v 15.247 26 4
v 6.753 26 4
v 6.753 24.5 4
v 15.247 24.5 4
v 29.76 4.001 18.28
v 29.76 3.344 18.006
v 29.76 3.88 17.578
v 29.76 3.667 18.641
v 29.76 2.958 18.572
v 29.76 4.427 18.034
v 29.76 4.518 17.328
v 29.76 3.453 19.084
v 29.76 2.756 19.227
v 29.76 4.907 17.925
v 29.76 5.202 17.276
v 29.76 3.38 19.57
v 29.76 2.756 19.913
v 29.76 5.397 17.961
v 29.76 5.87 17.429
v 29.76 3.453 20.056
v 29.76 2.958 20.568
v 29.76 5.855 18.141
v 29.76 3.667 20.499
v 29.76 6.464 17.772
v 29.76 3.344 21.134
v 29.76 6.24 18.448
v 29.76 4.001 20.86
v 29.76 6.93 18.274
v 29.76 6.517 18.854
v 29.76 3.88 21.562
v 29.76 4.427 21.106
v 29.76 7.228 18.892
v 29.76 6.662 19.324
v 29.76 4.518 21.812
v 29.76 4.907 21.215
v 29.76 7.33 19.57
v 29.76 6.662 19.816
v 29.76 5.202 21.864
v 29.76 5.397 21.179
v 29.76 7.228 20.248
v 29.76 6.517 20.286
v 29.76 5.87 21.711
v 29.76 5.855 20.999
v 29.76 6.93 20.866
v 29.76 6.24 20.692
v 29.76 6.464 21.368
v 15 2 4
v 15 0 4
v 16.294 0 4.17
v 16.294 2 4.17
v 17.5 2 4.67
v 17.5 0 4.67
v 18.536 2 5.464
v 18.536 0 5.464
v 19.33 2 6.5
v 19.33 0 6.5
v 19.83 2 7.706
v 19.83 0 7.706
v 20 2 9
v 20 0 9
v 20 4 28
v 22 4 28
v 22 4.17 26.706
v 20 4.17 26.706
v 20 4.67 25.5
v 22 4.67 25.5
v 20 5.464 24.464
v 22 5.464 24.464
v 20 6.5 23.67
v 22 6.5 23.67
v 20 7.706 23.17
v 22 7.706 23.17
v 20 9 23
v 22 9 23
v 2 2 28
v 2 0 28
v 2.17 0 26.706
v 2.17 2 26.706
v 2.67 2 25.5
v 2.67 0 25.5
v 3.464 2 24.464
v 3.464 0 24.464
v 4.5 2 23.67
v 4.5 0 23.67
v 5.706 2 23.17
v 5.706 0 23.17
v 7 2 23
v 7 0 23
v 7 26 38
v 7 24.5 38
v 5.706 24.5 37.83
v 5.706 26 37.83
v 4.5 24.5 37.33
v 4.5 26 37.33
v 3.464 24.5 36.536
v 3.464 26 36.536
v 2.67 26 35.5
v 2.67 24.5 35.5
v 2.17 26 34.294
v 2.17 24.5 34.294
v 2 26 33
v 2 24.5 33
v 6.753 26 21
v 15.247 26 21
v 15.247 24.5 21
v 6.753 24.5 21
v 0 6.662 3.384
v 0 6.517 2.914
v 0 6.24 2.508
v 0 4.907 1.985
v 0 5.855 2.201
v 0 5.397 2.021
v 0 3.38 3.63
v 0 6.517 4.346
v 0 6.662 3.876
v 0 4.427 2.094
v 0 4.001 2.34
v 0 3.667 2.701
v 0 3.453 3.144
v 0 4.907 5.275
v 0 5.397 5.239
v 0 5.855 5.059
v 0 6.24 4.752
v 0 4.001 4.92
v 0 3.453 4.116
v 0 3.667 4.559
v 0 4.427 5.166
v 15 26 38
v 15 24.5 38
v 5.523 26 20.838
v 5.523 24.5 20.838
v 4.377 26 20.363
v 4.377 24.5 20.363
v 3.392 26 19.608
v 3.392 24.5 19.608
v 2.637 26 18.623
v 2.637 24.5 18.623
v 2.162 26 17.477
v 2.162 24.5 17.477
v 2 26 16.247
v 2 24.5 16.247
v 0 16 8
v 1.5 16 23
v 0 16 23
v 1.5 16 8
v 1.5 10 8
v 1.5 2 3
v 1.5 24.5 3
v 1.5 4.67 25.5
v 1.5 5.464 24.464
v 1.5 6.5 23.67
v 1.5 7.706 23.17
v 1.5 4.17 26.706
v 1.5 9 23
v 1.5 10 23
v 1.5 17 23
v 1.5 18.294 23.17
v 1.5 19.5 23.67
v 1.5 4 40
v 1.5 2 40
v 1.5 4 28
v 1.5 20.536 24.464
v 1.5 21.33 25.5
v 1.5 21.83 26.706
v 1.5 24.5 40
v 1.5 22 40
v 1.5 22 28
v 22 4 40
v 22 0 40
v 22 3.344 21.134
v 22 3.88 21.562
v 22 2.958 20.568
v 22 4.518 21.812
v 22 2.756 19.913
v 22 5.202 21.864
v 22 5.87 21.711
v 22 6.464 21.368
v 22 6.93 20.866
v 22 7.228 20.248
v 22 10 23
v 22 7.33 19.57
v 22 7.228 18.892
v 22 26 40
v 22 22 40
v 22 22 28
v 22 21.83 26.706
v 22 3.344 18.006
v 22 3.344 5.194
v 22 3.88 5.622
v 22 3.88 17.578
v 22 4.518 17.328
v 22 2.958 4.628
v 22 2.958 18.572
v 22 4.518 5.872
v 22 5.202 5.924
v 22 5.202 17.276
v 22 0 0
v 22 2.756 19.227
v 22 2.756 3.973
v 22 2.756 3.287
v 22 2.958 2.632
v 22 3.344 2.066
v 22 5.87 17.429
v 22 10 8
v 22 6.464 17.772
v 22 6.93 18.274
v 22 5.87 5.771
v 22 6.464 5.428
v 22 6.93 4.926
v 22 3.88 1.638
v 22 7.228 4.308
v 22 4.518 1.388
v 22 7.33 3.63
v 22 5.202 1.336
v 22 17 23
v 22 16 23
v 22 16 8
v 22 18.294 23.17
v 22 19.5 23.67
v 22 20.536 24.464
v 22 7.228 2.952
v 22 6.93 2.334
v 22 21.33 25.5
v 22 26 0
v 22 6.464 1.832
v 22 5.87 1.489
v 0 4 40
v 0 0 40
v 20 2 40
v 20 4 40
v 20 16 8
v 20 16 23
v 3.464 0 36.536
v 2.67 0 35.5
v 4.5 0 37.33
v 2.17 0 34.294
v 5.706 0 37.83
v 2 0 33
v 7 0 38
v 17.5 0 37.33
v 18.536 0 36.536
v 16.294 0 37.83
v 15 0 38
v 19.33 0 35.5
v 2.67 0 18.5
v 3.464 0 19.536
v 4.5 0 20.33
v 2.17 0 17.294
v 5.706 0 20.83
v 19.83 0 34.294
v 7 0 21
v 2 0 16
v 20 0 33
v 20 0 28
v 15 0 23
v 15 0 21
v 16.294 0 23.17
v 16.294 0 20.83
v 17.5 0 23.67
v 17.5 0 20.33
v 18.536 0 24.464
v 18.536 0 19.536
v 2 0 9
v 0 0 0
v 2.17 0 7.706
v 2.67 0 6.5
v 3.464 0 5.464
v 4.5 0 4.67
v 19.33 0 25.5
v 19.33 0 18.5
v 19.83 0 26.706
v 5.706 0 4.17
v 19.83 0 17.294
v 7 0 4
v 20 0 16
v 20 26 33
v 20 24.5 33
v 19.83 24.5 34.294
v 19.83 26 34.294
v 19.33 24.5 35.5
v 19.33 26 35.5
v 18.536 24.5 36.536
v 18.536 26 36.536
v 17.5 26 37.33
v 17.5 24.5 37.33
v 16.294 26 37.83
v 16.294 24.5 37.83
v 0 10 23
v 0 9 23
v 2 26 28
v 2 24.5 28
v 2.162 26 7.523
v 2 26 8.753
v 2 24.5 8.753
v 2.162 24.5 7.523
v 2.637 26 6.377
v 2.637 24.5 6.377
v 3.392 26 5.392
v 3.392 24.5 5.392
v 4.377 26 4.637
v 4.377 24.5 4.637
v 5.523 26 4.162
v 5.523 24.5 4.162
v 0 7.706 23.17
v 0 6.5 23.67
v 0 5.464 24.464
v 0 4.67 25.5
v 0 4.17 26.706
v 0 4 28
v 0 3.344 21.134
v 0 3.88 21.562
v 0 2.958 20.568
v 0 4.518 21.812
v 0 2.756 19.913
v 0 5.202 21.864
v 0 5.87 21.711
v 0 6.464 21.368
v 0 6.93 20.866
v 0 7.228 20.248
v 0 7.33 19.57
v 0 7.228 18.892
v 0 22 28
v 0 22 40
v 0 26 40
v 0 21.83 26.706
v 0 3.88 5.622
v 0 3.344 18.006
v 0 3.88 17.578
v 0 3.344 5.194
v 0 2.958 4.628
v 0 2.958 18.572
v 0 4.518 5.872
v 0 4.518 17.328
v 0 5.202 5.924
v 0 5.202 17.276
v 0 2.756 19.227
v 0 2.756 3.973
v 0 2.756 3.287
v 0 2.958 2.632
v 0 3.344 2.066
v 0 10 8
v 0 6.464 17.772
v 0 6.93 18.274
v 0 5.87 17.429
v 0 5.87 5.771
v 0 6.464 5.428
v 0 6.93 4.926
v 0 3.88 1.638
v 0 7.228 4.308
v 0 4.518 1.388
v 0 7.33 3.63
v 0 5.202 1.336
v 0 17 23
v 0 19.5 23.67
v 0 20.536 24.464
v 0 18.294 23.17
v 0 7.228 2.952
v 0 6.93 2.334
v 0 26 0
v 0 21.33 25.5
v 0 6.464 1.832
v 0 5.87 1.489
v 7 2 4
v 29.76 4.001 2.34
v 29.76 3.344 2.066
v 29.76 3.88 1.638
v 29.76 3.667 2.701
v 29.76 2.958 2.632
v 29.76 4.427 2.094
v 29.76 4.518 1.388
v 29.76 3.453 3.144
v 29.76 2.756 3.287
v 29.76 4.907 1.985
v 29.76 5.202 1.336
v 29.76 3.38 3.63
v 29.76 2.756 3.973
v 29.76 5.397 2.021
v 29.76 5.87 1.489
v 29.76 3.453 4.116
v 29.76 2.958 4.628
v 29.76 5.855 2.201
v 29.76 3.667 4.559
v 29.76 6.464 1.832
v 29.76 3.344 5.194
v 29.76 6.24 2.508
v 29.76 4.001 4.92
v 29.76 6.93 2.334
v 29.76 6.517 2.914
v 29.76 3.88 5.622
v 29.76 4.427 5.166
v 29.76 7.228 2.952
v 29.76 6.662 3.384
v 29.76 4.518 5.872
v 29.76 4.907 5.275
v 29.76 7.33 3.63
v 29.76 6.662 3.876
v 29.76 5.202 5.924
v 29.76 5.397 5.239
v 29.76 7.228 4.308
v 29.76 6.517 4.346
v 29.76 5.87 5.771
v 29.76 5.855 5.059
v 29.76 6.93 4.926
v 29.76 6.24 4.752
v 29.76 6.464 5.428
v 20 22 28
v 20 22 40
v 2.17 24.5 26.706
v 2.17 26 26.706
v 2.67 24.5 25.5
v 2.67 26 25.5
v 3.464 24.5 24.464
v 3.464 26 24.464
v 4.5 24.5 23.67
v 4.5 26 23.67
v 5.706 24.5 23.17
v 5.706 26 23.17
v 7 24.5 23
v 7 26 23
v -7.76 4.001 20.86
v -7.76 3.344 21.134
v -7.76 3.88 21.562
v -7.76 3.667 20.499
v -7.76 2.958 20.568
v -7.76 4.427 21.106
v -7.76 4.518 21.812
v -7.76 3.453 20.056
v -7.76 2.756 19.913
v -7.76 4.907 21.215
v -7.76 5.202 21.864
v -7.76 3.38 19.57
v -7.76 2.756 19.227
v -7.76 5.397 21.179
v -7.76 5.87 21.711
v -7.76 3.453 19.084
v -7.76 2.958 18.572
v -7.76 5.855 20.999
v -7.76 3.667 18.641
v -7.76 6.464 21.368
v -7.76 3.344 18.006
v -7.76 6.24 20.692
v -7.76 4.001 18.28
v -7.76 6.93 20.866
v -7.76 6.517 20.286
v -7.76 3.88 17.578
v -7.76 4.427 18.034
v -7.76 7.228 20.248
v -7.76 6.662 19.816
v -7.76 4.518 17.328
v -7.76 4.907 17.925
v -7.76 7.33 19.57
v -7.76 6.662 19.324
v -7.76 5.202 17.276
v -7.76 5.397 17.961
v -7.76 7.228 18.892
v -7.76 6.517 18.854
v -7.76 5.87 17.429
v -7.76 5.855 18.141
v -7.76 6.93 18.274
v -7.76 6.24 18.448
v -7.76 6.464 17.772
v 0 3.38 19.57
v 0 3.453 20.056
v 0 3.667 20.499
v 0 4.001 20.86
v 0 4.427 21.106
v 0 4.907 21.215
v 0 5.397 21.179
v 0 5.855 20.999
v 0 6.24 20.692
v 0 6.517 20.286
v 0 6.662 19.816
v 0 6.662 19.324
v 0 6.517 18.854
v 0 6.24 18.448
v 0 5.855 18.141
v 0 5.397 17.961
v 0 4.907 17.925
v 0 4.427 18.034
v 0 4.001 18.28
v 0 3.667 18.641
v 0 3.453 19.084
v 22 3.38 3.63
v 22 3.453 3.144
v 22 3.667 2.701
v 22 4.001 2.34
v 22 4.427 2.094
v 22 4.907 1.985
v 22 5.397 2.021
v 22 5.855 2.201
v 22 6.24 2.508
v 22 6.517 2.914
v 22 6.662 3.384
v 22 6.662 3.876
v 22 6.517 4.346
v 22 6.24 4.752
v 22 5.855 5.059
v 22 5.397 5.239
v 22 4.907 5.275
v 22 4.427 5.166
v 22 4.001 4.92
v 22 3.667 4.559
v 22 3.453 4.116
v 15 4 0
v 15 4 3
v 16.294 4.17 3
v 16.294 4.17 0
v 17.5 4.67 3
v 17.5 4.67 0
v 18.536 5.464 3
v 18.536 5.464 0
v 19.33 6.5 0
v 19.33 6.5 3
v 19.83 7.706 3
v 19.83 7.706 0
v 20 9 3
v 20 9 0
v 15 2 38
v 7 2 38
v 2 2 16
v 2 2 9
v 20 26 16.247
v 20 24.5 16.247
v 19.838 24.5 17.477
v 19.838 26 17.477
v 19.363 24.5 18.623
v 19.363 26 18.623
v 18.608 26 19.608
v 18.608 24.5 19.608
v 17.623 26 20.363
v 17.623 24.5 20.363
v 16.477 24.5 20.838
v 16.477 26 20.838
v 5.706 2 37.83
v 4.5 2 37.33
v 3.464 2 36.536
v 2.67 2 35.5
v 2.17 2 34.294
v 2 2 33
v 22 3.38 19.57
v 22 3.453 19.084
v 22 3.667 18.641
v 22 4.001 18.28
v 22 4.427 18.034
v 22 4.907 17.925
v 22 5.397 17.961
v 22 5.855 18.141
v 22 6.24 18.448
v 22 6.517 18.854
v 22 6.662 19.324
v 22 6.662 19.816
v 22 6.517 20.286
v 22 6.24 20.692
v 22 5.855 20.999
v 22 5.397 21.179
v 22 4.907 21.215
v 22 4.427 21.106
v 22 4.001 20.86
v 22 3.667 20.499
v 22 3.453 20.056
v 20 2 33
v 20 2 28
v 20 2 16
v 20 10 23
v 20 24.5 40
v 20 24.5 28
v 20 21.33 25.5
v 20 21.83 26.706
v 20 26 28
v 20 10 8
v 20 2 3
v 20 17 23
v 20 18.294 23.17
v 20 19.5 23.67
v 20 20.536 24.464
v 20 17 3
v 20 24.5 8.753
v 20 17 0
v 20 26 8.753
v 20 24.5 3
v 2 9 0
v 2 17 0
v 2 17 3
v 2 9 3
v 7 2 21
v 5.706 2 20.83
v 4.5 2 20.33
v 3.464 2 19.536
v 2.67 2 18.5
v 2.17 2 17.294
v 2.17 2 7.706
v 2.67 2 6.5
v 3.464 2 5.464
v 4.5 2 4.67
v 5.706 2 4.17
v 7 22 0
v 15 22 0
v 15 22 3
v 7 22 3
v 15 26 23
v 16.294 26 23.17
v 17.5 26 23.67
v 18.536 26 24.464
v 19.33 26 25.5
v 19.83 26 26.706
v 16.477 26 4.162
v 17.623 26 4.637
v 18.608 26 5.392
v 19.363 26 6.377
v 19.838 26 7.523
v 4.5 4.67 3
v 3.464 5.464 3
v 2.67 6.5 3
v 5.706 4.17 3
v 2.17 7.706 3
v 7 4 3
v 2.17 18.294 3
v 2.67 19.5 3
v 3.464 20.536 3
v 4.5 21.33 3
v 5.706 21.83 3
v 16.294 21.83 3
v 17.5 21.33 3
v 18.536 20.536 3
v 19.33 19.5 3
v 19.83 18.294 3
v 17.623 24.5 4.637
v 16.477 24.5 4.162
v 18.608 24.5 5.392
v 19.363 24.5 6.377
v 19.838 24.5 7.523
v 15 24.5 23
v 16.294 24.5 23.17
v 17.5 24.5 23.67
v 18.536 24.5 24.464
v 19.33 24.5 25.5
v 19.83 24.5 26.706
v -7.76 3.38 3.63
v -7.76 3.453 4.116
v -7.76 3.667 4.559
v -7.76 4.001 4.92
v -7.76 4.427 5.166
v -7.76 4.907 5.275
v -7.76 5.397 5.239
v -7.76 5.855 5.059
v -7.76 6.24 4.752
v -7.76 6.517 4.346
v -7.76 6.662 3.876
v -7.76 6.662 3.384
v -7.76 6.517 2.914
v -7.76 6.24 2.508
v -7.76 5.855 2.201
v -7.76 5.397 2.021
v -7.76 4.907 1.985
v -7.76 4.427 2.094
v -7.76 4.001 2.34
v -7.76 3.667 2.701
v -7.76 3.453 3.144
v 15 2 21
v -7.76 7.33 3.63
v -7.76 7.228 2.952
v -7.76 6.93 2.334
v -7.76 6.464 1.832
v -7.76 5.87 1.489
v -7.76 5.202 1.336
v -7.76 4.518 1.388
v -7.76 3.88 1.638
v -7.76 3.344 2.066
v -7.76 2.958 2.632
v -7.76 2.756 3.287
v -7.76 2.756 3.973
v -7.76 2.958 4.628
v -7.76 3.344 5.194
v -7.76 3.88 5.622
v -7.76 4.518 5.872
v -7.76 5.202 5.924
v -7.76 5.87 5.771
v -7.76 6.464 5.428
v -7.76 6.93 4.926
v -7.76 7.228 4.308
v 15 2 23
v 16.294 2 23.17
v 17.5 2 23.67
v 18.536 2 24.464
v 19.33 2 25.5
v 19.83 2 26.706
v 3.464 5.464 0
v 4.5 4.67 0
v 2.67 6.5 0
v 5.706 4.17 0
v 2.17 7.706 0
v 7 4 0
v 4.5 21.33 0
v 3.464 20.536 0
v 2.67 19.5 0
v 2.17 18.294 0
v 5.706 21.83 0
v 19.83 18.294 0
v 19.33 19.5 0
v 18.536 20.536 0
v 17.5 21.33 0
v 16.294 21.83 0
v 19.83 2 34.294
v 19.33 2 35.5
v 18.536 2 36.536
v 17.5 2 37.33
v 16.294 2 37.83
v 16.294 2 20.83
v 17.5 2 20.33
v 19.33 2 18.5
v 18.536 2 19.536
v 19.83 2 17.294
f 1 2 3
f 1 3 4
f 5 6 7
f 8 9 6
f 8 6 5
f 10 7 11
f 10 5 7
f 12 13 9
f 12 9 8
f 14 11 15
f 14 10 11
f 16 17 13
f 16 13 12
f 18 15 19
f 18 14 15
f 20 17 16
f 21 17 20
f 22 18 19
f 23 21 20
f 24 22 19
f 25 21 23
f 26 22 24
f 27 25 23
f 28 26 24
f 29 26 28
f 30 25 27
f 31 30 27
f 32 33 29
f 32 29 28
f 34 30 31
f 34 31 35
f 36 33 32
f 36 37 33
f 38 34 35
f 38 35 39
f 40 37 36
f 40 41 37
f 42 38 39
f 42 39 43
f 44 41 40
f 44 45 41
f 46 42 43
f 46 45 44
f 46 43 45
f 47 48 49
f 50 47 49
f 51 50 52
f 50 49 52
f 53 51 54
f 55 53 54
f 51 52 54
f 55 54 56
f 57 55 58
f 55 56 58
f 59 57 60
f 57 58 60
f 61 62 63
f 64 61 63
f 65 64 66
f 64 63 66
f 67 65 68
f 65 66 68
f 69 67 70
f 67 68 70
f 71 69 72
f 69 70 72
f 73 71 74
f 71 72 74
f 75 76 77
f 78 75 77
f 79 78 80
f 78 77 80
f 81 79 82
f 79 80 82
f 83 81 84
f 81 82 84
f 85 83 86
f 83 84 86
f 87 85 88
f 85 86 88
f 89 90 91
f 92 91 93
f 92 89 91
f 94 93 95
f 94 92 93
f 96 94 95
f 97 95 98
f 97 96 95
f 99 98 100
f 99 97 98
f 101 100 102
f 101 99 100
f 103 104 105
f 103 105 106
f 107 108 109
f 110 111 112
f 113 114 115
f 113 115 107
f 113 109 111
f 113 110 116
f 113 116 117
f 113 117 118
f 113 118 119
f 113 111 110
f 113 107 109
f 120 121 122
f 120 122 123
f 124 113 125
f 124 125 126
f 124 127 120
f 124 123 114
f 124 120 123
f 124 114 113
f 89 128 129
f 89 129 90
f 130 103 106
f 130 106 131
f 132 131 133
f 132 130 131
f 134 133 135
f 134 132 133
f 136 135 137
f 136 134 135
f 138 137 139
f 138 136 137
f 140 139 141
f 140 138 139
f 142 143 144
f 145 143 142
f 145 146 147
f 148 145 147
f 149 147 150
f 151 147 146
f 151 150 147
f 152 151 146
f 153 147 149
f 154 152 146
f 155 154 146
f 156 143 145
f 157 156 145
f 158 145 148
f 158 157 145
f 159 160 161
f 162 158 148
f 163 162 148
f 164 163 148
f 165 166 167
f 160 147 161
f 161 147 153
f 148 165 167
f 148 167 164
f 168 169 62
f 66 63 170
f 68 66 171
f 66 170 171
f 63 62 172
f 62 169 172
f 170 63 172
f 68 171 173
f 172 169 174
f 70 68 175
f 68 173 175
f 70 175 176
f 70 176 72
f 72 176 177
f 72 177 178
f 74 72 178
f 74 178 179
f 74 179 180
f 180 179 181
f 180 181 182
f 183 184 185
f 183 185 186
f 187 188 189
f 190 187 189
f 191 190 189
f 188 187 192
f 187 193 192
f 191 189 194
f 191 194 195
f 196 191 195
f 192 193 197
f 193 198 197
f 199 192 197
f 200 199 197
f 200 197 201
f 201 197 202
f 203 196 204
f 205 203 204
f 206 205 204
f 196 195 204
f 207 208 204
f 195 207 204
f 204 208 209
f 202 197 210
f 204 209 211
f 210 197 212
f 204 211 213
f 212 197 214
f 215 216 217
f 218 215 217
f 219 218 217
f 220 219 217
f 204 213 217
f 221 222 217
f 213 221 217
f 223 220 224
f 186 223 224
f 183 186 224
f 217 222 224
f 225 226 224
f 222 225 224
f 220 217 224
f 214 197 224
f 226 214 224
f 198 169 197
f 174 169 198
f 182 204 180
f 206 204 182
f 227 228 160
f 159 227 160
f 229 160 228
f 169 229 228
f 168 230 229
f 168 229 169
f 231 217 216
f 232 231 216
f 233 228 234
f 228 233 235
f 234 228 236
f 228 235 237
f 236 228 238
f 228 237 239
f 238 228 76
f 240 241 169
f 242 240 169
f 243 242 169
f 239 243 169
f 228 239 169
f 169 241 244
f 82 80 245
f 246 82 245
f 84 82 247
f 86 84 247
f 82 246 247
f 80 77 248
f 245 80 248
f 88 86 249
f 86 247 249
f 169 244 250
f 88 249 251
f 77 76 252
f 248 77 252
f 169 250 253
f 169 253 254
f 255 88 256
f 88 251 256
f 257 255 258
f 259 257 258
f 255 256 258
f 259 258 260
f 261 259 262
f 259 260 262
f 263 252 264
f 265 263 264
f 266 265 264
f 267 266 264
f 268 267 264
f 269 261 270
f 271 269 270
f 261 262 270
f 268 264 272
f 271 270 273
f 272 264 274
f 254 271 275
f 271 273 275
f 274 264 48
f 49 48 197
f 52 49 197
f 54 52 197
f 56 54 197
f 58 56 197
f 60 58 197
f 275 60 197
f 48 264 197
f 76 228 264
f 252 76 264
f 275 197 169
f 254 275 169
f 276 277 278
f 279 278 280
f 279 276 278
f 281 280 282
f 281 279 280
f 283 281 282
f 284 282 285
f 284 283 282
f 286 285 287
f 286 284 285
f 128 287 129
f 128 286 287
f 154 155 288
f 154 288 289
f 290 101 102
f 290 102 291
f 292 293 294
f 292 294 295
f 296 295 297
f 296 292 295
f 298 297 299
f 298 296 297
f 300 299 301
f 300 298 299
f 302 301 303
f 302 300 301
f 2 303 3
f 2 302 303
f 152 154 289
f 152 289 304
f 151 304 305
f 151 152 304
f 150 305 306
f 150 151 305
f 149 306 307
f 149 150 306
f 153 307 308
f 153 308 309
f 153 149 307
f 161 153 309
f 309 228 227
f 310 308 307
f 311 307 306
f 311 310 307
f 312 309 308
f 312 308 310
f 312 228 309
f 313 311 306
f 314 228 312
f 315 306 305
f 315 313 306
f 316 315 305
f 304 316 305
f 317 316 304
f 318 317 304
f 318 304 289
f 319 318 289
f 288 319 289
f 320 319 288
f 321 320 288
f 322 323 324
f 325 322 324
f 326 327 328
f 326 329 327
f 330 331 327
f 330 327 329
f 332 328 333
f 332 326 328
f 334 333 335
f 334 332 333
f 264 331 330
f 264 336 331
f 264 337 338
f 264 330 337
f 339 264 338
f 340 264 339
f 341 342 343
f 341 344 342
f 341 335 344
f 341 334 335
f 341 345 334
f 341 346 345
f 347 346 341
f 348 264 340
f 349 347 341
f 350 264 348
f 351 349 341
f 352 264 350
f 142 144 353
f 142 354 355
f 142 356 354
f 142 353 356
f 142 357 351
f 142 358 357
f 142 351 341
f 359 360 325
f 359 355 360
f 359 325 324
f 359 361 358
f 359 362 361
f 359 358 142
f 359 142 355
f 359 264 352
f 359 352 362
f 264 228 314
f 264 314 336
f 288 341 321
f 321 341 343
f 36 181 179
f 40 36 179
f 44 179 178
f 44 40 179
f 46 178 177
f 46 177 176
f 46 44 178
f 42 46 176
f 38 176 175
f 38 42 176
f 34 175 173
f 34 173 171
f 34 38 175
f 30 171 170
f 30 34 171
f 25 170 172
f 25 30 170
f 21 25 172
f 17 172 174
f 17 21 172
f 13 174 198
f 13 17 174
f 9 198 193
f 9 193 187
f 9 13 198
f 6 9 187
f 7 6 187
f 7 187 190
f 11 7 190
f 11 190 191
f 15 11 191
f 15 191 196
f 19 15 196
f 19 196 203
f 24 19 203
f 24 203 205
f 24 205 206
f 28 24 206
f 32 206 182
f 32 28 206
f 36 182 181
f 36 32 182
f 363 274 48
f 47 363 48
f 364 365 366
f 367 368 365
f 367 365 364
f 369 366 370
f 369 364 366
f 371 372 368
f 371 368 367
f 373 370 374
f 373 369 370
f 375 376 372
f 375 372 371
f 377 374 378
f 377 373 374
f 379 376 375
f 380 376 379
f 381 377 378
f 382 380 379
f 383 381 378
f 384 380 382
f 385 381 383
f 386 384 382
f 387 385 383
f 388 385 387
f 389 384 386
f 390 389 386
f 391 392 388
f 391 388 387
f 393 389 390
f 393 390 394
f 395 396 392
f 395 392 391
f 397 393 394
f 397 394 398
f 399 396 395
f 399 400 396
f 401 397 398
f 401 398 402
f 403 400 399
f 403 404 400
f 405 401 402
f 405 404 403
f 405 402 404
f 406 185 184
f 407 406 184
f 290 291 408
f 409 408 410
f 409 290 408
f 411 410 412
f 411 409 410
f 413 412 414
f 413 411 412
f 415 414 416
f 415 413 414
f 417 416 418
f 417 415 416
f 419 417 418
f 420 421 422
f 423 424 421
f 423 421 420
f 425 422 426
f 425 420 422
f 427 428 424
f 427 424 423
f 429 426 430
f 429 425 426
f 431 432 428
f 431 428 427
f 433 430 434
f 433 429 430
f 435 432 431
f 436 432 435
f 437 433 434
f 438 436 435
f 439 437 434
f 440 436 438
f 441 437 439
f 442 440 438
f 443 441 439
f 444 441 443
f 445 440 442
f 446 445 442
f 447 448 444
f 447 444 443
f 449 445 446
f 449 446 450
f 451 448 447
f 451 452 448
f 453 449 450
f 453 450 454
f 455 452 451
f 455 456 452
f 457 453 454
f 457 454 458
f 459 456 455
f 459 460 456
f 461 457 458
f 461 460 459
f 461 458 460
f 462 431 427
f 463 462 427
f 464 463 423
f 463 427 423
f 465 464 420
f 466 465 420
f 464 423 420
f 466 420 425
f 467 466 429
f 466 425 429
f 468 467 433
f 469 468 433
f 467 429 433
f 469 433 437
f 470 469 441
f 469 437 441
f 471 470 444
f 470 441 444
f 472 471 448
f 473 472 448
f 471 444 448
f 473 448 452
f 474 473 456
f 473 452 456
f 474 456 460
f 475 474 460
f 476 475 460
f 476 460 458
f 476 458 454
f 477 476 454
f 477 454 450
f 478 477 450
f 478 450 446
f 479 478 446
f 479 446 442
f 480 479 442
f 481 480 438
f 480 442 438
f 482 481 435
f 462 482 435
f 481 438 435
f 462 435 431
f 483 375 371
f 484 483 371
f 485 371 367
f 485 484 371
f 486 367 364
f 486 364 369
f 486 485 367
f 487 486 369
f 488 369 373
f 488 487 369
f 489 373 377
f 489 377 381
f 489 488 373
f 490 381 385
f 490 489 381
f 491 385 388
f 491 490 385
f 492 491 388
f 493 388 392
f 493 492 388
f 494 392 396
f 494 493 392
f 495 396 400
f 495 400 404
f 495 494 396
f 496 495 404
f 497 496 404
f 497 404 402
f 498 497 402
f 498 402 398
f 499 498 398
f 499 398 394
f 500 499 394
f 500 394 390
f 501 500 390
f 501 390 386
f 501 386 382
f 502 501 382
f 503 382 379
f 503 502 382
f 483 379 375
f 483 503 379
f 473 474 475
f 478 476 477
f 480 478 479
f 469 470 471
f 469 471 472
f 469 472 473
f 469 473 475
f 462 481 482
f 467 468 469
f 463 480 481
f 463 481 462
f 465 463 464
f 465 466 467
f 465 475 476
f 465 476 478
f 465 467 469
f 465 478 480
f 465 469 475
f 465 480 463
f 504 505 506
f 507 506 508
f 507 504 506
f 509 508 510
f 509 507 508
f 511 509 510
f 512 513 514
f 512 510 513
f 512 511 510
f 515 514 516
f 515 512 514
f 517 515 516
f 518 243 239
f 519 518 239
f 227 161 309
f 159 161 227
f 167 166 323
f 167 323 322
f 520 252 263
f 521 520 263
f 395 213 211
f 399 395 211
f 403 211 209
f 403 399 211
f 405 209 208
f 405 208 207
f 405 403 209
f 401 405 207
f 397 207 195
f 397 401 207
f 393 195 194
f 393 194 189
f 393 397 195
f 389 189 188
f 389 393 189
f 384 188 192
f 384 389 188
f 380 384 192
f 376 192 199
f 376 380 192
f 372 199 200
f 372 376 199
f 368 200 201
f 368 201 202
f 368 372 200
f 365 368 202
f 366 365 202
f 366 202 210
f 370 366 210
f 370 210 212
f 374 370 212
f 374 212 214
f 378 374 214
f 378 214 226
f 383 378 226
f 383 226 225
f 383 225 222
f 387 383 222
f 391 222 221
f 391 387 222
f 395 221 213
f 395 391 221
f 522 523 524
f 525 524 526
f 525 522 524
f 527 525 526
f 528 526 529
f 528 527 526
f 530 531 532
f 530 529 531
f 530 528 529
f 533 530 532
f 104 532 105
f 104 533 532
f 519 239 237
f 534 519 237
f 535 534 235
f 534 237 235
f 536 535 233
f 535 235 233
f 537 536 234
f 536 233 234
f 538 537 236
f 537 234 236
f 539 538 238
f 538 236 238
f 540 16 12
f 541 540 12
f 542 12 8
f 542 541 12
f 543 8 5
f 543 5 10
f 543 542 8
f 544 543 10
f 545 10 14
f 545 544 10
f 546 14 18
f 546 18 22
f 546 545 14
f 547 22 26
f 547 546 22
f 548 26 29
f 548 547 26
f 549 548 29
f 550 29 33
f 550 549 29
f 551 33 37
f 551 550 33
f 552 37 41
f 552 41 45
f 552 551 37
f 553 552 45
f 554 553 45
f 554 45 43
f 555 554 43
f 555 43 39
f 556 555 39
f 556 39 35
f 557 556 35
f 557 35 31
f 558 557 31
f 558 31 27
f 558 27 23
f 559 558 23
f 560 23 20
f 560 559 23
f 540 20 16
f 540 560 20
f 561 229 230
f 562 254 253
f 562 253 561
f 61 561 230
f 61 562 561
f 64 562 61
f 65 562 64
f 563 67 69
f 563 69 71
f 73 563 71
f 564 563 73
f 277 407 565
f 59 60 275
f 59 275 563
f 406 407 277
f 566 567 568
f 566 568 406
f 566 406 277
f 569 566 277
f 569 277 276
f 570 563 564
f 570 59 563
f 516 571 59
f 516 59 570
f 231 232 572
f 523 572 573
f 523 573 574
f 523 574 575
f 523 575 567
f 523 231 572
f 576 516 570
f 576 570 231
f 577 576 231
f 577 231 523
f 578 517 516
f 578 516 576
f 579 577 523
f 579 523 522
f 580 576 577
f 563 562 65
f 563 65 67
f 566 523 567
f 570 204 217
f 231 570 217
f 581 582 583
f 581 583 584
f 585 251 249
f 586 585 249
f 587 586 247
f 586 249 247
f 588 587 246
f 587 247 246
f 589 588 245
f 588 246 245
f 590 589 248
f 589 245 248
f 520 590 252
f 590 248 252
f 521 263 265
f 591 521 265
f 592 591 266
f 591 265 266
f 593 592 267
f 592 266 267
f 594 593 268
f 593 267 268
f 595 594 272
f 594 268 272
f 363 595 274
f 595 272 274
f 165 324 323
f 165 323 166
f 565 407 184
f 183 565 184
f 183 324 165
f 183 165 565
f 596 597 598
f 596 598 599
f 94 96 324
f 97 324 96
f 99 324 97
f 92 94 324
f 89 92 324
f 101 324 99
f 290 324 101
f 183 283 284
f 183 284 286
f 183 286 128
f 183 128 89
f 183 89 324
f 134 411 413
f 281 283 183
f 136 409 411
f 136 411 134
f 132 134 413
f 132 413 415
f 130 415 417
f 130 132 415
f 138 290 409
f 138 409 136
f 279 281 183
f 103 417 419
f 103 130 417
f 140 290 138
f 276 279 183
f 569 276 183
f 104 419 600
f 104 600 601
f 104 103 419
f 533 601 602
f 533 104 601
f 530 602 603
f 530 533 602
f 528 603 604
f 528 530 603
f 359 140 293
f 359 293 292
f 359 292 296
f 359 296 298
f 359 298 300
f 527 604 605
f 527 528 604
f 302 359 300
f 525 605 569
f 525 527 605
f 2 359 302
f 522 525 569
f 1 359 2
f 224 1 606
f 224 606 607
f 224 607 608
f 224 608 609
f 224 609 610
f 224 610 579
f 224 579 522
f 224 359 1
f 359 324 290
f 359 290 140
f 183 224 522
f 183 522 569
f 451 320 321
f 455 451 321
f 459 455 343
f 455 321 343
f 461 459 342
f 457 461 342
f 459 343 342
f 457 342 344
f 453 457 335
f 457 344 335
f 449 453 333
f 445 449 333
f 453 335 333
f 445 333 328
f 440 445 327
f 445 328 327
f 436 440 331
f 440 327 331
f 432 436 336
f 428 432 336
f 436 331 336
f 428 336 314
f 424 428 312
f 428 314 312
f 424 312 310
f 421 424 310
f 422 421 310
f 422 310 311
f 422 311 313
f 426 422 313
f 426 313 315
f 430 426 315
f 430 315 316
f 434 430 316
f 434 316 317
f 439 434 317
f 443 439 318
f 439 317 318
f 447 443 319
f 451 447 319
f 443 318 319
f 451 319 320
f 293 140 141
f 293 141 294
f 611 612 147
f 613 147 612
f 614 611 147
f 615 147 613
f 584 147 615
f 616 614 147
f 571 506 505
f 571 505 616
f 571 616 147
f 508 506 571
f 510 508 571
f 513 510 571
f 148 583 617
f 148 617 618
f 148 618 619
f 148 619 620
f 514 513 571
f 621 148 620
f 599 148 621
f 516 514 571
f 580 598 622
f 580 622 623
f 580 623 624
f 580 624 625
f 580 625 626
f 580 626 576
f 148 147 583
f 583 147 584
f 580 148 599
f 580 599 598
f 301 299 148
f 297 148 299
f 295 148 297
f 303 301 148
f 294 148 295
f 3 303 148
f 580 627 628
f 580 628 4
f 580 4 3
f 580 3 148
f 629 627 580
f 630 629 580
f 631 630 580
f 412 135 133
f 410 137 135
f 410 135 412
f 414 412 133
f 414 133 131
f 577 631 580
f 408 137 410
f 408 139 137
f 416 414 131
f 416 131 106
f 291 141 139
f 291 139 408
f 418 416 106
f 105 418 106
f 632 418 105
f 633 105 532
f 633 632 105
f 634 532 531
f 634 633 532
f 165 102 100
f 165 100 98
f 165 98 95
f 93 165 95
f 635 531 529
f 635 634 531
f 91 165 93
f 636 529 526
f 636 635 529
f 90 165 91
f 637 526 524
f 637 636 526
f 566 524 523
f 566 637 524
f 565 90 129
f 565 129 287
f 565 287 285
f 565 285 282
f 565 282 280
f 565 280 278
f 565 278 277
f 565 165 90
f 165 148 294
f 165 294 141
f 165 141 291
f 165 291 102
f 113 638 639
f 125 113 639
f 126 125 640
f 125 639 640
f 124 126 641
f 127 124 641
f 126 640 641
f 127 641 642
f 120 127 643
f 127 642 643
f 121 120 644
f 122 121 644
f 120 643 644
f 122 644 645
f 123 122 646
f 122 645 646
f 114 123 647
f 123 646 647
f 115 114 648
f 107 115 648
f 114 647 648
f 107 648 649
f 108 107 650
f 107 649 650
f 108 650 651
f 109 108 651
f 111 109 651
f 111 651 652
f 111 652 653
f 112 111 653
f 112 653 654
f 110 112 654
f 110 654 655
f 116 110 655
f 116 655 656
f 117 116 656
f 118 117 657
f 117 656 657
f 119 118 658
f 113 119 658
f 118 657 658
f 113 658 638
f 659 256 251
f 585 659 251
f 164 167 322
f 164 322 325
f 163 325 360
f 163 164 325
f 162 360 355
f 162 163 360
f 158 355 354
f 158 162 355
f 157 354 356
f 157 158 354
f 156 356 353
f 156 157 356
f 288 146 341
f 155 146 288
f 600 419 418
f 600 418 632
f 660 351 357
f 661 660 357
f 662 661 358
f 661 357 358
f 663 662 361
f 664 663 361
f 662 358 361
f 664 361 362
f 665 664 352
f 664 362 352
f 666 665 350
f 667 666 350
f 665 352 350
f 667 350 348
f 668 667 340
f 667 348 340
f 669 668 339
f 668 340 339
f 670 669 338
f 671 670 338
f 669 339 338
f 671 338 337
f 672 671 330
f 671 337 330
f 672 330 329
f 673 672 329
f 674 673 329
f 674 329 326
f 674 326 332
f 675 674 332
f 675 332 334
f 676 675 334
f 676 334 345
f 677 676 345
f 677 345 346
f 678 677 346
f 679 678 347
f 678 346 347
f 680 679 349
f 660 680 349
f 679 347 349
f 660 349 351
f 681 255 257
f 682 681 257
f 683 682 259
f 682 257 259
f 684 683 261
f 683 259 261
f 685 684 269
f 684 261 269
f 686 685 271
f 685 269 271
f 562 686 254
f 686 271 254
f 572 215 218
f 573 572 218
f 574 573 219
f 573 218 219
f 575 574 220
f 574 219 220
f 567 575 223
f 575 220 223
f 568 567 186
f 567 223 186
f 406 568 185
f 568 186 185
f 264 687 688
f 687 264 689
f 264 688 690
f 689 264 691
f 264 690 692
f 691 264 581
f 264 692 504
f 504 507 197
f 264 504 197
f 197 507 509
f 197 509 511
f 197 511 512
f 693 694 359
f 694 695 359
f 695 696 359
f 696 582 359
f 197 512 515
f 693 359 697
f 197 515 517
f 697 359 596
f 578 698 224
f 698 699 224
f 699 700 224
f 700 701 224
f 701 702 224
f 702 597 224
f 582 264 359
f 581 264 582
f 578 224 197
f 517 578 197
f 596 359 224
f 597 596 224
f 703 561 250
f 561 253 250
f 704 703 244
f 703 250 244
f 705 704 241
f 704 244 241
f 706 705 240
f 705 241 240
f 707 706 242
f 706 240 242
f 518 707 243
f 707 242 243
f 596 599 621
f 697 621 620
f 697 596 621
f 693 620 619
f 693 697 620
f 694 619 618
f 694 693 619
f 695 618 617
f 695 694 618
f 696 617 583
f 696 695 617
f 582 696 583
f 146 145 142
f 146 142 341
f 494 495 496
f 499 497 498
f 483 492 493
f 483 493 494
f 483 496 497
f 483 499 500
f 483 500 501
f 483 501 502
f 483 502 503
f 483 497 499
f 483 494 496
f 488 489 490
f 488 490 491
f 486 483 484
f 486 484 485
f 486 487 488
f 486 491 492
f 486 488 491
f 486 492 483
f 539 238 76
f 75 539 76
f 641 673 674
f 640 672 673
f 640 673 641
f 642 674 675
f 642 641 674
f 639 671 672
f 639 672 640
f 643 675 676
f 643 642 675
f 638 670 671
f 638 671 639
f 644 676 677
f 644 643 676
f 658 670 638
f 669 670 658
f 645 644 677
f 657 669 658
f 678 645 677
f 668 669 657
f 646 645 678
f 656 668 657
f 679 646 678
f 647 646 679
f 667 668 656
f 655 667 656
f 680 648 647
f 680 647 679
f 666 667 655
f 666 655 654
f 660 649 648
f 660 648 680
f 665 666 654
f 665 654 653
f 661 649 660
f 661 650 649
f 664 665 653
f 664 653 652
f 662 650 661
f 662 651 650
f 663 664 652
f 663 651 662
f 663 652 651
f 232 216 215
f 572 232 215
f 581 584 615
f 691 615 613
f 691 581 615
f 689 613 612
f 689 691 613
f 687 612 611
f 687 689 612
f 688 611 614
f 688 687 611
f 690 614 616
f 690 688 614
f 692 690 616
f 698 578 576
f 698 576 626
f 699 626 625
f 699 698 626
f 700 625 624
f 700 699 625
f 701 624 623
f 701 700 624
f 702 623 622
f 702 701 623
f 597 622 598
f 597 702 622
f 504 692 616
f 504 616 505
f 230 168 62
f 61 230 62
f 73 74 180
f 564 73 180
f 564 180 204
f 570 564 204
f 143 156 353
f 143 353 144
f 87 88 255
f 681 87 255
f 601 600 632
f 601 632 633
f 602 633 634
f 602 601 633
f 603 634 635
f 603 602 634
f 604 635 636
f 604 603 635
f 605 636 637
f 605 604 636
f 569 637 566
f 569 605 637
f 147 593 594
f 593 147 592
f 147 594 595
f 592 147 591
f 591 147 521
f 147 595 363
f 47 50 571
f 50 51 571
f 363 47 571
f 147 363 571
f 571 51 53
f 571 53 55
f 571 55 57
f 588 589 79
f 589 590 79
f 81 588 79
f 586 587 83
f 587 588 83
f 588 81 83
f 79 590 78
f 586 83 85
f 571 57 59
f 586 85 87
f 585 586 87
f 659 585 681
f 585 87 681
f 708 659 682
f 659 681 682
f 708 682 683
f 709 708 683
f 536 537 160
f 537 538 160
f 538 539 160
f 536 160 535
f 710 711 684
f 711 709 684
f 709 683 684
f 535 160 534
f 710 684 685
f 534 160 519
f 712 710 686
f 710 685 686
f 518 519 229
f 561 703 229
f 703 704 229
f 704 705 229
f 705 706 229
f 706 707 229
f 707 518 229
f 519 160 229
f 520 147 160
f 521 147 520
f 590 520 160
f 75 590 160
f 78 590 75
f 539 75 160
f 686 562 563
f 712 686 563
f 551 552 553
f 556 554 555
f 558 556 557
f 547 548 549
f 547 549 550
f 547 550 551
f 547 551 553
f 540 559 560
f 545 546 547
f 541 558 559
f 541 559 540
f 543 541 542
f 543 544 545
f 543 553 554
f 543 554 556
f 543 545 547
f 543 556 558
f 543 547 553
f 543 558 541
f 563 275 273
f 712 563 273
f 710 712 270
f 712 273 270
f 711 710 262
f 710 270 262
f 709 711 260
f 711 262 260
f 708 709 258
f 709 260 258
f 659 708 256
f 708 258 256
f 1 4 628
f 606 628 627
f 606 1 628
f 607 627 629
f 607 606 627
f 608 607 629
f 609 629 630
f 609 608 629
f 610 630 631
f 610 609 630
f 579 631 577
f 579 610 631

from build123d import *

# Parameters (mm, degrees)
SKETCH1_W           = 22
SKETCH1_H           = 26
BOSS_EXTRUDE1_DEPTH = 40
SKETCH2_W           = 18.5
SKETCH2_H           = 22.5
CUT_EXTRUDE1_DEPTH  = 37
CUT_EXTRUDE2_REACH  = 54.536
CUT_EXTRUDE3_DEPTH  = 2
CUT_EXTRUDE4_START  = -1.5
CUT_EXTRUDE4_DEPTH  = 1.5
CUT_EXTRUDE5_REACH  = 54.536
CUT_EXTRUDE6_REACH  = 54.536
SKETCH12_R          = 2.3
BOSS_EXTRUDE2_DEPTH = 7.76
SKETCH14_R          = 1.65
CUT_EXTRUDE9_DEPTH  = 7.76
SKETCH16_R          = 1.65
CUT_EXTRUDE11_DEPTH = 7.76
BOSS_EXTRUDE3_START = 7.76
SKETCH17_R          = 2.3
BOSS_EXTRUDE3_DEPTH = 7.76
CUT_EXTRUDE12_START = -7.76
SKETCH20_R          = 1.65
CUT_EXTRUDE12_DEPTH = 7.76


with BuildPart() as part:
    # Sketch1 → Boss-Extrude1 (new body)
    with BuildSketch(Plane.XY):
        with Locations((11, 13)):
            Rectangle(SKETCH1_W, SKETCH1_H)
    extrude(amount=BOSS_EXTRUDE1_DEPTH)

    # Sketch2 → Cut-Extrude1 (cut)
    with BuildSketch(Plane.XY.offset(40)):
        with Locations((10.75, 13.25)):
            Rectangle(SKETCH2_W, SKETCH2_H)
    extrude(amount=-CUT_EXTRUDE1_DEPTH, mode=Mode.SUBTRACT)

    # Sketch6 → Cut-Extrude2 (cut, up to next)
    with BuildSketch(Plane(origin=(0, 0, 0), x_dir=(-1, 0, 0), z_dir=(0, 0, -1)), mode=Mode.PRIVATE) as cut_extrude2_sk1:
        with BuildLine():
            Line((-15, 22), (-7, 22))
            ThreePointArc((-7, 22), (-3.464466094, 20.535533906), (-2, 17))
            Line((-2, 17), (-2, 9))
            ThreePointArc((-2, 9), (-3.464466094, 5.464466094), (-7, 4))
            Line((-7, 4), (-15, 4))
            ThreePointArc((-15, 4), (-18.535533906, 5.464466094), (-20, 9))
            Line((-20, 9), (-20, 17))
            ThreePointArc((-20, 17), (-18.535533906, 20.535533906), (-15, 22))
        make_face()
    cut_extrude2_tool1 = extrude(cut_extrude2_sk1.sketch, amount=-CUT_EXTRUDE2_REACH, mode=Mode.PRIVATE) & part.part
    add(cut_extrude2_tool1.solids().sort_by_distance((11, 13, 0))[0], mode=Mode.SUBTRACT)

    # Sketch7 → Cut-Extrude3 (cut)
    with BuildSketch(Plane(origin=(22, 0, 0), x_dir=(0, 0, -1), z_dir=(1, 0, 0))):
        with BuildLine():
            Line((-8, 16), (-23, 16))
            Line((-23, 16), (-23, 17))
            ThreePointArc((-23, 17), (-24.464466094, 20.535533906), (-28, 22))
            Line((-28, 22), (-40, 22))
            Line((-40, 22), (-40, 16))
            Line((-40, 16), (-40, 10))
            Line((-40, 10), (-40, 4))
            Line((-40, 4), (-28, 4))
            ThreePointArc((-28, 4), (-24.464466094, 5.464466094), (-23, 9))
            Line((-23, 9), (-23, 10))
            Line((-23, 10), (-8, 10))
            Line((-8, 10), (-8, 16))
        make_face()
    extrude(amount=-CUT_EXTRUDE3_DEPTH, mode=Mode.SUBTRACT)

    # Sketch8 → Cut-Extrude4 (cut)
    with BuildSketch(Plane.ZY.offset(CUT_EXTRUDE4_START)):
        with BuildLine():
            Line((23, 17), (23, 16))
            Line((23, 16), (8, 16))
            Line((8, 16), (8, 10))
            Line((8, 10), (23, 10))
            Line((23, 10), (23, 9))
            ThreePointArc((23, 9), (24.464466094, 5.464466094), (28, 4))
            Line((28, 4), (40, 4))
            Line((40, 4), (40, 22))
            Line((40, 22), (28, 22))
            ThreePointArc((28, 22), (24.464466094, 20.535533906), (23, 17))
        make_face()
    extrude(amount=CUT_EXTRUDE4_DEPTH, mode=Mode.SUBTRACT)

    # Sketch9 → Cut-Extrude5 (cut, up to next)
    with BuildSketch(Plane(origin=(0, 26, 0), x_dir=(1, 0, 0), z_dir=(0, 1, 0)), mode=Mode.PRIVATE) as cut_extrude5_sk1:
        with BuildLine():
            Line((7, -23), (15, -23))
            ThreePointArc((15, -23), (18.535533906, -24.464466094), (20, -28))
            Line((20, -28), (20, -33))
            ThreePointArc((20, -33), (18.535533906, -36.535533906), (15, -38))
            Line((15, -38), (7, -38))
            ThreePointArc((7, -38), (3.464466094, -36.535533906), (2, -33))
            Line((2, -33), (2, -28))
            ThreePointArc((2, -28), (3.464466094, -24.464466094), (7, -23))
        make_face()
    cut_extrude5_tool1 = extrude(cut_extrude5_sk1.sketch, amount=-CUT_EXTRUDE5_REACH, mode=Mode.PRIVATE) & part.part
    # Sketch9 → Cut-Extrude5 (cut, up to next)
    with BuildSketch(Plane(origin=(0, 26, 0), x_dir=(1, 0, 0), z_dir=(0, 1, 0)), mode=Mode.PRIVATE) as cut_extrude5_sk2:
        with BuildLine():
            Line((2, -16.246572976), (2, -8.753427024))
            ThreePointArc((2, -8.753427024), (3.392246541, -5.392246541), (6.753427024, -4))
            Line((6.753427024, -4), (15.246572976, -4))
            ThreePointArc((15.246572976, -4), (18.607753459, -5.392246541), (20, -8.753427024))
            Line((20, -8.753427024), (20, -16.246572976))
            ThreePointArc((20, -16.246572976), (18.607753459, -19.607753459), (15.246572976, -21))
            Line((15.246572976, -21), (6.753427024, -21))
            ThreePointArc((6.753427024, -21), (3.392246541, -19.607753459), (2, -16.246572976))
        make_face()
    cut_extrude5_tool2 = extrude(cut_extrude5_sk2.sketch, amount=-CUT_EXTRUDE5_REACH, mode=Mode.PRIVATE) & part.part
    add(cut_extrude5_tool1.solids().sort_by_distance((11, 26, 30.5))[0], mode=Mode.SUBTRACT)
    add(cut_extrude5_tool2.solids().sort_by_distance((11, 26, 12.5))[0], mode=Mode.SUBTRACT)

    # Sketch11 → Cut-Extrude6 (cut, up to next)
    with BuildSketch(Plane.XZ, mode=Mode.PRIVATE) as cut_extrude6_sk1:
        with BuildLine():
            Line((7, 23), (15, 23))
            ThreePointArc((15, 23), (18.535533906, 24.464466094), (20, 28))
            Line((20, 28), (20, 33))
            ThreePointArc((20, 33), (18.535533906, 36.535533906), (15, 38))
            Line((15, 38), (7, 38))
            ThreePointArc((7, 38), (3.464466094, 36.535533906), (2, 33))
            Line((2, 33), (2, 28))
            ThreePointArc((2, 28), (3.464466094, 24.464466094), (7, 23))
        make_face()
    cut_extrude6_tool1 = extrude(cut_extrude6_sk1.sketch, amount=-CUT_EXTRUDE6_REACH, mode=Mode.PRIVATE) & part.part
    # Sketch11 → Cut-Extrude6 (cut, up to next)
    with BuildSketch(Plane.XZ, mode=Mode.PRIVATE) as cut_extrude6_sk2:
        with BuildLine():
            Line((2, 16), (2, 9))
            ThreePointArc((2, 9), (3.464466094, 5.464466094), (7, 4))
            Line((7, 4), (15, 4))
            ThreePointArc((15, 4), (18.535533906, 5.464466094), (20, 9))
            Line((20, 9), (20, 16))
            ThreePointArc((20, 16), (18.535533906, 19.535533906), (15, 21))
            Line((15, 21), (7, 21))
            ThreePointArc((7, 21), (3.464466094, 19.535533906), (2, 16))
        make_face()
    cut_extrude6_tool2 = extrude(cut_extrude6_sk2.sketch, amount=-CUT_EXTRUDE6_REACH, mode=Mode.PRIVATE) & part.part
    add(cut_extrude6_tool1.solids().sort_by_distance((11, 0, 30.5))[0], mode=Mode.SUBTRACT)
    add(cut_extrude6_tool2.solids().sort_by_distance((11, 0, 12.5))[0], mode=Mode.SUBTRACT)

    # Sketch12 → Boss-Extrude2 (add)
    with BuildSketch(Plane.ZY):
        with Locations(Location((3.63, 5.03, 0), (0, 0, 90))):
            Circle(SKETCH12_R)
        with Locations(Location((19.57, 5.03, 0), (0, 0, 90))):
            Circle(SKETCH12_R)
    extrude(amount=BOSS_EXTRUDE2_DEPTH)

    # Sketch14 → Cut-Extrude9 (cut)
    with BuildSketch(Plane.ZY.offset(7.76)):
        with Locations(Location((3.63, 5.03, 0), (0, 0, 270))):
            Circle(SKETCH14_R)
    extrude(amount=-CUT_EXTRUDE9_DEPTH, mode=Mode.SUBTRACT)

    # Sketch16 → Cut-Extrude11 (cut)
    with BuildSketch(Plane.ZY.offset(7.76)):
        with Locations(Location((19.57, 5.03, 0), (0, 0, 270))):
            Circle(SKETCH16_R)
    extrude(amount=-CUT_EXTRUDE11_DEPTH, mode=Mode.SUBTRACT)

    # Sketch17 → Boss-Extrude3 (add)
    with BuildSketch(Plane(origin=(22, 0, 0), x_dir=(0, 0, -1), z_dir=(1, 0, 0)).offset(BOSS_EXTRUDE3_START)):
        with Locations(Location((-3.63, 5.03, 0), (0, 0, 90))):
            Circle(SKETCH17_R)
        with Locations(Location((-19.57, 5.03, 0), (0, 0, 90))):
            Circle(SKETCH17_R)
    extrude(amount=-BOSS_EXTRUDE3_DEPTH)

    # Sketch20 → Cut-Extrude12 (cut)
    with BuildSketch(Plane(origin=(29.76, 0, 0), x_dir=(0, 0, -1), z_dir=(1, 0, 0)).offset(CUT_EXTRUDE12_START)):
        with Locations(Location((-3.63, 5.03, 0), (0, 0, 270))):
            Circle(SKETCH20_R)
        with Locations(Location((-19.57, 5.03, 0), (0, 0, 270))):
            Circle(SKETCH20_R)
    extrude(amount=CUT_EXTRUDE12_DEPTH, mode=Mode.SUBTRACT)


solid = part.part
